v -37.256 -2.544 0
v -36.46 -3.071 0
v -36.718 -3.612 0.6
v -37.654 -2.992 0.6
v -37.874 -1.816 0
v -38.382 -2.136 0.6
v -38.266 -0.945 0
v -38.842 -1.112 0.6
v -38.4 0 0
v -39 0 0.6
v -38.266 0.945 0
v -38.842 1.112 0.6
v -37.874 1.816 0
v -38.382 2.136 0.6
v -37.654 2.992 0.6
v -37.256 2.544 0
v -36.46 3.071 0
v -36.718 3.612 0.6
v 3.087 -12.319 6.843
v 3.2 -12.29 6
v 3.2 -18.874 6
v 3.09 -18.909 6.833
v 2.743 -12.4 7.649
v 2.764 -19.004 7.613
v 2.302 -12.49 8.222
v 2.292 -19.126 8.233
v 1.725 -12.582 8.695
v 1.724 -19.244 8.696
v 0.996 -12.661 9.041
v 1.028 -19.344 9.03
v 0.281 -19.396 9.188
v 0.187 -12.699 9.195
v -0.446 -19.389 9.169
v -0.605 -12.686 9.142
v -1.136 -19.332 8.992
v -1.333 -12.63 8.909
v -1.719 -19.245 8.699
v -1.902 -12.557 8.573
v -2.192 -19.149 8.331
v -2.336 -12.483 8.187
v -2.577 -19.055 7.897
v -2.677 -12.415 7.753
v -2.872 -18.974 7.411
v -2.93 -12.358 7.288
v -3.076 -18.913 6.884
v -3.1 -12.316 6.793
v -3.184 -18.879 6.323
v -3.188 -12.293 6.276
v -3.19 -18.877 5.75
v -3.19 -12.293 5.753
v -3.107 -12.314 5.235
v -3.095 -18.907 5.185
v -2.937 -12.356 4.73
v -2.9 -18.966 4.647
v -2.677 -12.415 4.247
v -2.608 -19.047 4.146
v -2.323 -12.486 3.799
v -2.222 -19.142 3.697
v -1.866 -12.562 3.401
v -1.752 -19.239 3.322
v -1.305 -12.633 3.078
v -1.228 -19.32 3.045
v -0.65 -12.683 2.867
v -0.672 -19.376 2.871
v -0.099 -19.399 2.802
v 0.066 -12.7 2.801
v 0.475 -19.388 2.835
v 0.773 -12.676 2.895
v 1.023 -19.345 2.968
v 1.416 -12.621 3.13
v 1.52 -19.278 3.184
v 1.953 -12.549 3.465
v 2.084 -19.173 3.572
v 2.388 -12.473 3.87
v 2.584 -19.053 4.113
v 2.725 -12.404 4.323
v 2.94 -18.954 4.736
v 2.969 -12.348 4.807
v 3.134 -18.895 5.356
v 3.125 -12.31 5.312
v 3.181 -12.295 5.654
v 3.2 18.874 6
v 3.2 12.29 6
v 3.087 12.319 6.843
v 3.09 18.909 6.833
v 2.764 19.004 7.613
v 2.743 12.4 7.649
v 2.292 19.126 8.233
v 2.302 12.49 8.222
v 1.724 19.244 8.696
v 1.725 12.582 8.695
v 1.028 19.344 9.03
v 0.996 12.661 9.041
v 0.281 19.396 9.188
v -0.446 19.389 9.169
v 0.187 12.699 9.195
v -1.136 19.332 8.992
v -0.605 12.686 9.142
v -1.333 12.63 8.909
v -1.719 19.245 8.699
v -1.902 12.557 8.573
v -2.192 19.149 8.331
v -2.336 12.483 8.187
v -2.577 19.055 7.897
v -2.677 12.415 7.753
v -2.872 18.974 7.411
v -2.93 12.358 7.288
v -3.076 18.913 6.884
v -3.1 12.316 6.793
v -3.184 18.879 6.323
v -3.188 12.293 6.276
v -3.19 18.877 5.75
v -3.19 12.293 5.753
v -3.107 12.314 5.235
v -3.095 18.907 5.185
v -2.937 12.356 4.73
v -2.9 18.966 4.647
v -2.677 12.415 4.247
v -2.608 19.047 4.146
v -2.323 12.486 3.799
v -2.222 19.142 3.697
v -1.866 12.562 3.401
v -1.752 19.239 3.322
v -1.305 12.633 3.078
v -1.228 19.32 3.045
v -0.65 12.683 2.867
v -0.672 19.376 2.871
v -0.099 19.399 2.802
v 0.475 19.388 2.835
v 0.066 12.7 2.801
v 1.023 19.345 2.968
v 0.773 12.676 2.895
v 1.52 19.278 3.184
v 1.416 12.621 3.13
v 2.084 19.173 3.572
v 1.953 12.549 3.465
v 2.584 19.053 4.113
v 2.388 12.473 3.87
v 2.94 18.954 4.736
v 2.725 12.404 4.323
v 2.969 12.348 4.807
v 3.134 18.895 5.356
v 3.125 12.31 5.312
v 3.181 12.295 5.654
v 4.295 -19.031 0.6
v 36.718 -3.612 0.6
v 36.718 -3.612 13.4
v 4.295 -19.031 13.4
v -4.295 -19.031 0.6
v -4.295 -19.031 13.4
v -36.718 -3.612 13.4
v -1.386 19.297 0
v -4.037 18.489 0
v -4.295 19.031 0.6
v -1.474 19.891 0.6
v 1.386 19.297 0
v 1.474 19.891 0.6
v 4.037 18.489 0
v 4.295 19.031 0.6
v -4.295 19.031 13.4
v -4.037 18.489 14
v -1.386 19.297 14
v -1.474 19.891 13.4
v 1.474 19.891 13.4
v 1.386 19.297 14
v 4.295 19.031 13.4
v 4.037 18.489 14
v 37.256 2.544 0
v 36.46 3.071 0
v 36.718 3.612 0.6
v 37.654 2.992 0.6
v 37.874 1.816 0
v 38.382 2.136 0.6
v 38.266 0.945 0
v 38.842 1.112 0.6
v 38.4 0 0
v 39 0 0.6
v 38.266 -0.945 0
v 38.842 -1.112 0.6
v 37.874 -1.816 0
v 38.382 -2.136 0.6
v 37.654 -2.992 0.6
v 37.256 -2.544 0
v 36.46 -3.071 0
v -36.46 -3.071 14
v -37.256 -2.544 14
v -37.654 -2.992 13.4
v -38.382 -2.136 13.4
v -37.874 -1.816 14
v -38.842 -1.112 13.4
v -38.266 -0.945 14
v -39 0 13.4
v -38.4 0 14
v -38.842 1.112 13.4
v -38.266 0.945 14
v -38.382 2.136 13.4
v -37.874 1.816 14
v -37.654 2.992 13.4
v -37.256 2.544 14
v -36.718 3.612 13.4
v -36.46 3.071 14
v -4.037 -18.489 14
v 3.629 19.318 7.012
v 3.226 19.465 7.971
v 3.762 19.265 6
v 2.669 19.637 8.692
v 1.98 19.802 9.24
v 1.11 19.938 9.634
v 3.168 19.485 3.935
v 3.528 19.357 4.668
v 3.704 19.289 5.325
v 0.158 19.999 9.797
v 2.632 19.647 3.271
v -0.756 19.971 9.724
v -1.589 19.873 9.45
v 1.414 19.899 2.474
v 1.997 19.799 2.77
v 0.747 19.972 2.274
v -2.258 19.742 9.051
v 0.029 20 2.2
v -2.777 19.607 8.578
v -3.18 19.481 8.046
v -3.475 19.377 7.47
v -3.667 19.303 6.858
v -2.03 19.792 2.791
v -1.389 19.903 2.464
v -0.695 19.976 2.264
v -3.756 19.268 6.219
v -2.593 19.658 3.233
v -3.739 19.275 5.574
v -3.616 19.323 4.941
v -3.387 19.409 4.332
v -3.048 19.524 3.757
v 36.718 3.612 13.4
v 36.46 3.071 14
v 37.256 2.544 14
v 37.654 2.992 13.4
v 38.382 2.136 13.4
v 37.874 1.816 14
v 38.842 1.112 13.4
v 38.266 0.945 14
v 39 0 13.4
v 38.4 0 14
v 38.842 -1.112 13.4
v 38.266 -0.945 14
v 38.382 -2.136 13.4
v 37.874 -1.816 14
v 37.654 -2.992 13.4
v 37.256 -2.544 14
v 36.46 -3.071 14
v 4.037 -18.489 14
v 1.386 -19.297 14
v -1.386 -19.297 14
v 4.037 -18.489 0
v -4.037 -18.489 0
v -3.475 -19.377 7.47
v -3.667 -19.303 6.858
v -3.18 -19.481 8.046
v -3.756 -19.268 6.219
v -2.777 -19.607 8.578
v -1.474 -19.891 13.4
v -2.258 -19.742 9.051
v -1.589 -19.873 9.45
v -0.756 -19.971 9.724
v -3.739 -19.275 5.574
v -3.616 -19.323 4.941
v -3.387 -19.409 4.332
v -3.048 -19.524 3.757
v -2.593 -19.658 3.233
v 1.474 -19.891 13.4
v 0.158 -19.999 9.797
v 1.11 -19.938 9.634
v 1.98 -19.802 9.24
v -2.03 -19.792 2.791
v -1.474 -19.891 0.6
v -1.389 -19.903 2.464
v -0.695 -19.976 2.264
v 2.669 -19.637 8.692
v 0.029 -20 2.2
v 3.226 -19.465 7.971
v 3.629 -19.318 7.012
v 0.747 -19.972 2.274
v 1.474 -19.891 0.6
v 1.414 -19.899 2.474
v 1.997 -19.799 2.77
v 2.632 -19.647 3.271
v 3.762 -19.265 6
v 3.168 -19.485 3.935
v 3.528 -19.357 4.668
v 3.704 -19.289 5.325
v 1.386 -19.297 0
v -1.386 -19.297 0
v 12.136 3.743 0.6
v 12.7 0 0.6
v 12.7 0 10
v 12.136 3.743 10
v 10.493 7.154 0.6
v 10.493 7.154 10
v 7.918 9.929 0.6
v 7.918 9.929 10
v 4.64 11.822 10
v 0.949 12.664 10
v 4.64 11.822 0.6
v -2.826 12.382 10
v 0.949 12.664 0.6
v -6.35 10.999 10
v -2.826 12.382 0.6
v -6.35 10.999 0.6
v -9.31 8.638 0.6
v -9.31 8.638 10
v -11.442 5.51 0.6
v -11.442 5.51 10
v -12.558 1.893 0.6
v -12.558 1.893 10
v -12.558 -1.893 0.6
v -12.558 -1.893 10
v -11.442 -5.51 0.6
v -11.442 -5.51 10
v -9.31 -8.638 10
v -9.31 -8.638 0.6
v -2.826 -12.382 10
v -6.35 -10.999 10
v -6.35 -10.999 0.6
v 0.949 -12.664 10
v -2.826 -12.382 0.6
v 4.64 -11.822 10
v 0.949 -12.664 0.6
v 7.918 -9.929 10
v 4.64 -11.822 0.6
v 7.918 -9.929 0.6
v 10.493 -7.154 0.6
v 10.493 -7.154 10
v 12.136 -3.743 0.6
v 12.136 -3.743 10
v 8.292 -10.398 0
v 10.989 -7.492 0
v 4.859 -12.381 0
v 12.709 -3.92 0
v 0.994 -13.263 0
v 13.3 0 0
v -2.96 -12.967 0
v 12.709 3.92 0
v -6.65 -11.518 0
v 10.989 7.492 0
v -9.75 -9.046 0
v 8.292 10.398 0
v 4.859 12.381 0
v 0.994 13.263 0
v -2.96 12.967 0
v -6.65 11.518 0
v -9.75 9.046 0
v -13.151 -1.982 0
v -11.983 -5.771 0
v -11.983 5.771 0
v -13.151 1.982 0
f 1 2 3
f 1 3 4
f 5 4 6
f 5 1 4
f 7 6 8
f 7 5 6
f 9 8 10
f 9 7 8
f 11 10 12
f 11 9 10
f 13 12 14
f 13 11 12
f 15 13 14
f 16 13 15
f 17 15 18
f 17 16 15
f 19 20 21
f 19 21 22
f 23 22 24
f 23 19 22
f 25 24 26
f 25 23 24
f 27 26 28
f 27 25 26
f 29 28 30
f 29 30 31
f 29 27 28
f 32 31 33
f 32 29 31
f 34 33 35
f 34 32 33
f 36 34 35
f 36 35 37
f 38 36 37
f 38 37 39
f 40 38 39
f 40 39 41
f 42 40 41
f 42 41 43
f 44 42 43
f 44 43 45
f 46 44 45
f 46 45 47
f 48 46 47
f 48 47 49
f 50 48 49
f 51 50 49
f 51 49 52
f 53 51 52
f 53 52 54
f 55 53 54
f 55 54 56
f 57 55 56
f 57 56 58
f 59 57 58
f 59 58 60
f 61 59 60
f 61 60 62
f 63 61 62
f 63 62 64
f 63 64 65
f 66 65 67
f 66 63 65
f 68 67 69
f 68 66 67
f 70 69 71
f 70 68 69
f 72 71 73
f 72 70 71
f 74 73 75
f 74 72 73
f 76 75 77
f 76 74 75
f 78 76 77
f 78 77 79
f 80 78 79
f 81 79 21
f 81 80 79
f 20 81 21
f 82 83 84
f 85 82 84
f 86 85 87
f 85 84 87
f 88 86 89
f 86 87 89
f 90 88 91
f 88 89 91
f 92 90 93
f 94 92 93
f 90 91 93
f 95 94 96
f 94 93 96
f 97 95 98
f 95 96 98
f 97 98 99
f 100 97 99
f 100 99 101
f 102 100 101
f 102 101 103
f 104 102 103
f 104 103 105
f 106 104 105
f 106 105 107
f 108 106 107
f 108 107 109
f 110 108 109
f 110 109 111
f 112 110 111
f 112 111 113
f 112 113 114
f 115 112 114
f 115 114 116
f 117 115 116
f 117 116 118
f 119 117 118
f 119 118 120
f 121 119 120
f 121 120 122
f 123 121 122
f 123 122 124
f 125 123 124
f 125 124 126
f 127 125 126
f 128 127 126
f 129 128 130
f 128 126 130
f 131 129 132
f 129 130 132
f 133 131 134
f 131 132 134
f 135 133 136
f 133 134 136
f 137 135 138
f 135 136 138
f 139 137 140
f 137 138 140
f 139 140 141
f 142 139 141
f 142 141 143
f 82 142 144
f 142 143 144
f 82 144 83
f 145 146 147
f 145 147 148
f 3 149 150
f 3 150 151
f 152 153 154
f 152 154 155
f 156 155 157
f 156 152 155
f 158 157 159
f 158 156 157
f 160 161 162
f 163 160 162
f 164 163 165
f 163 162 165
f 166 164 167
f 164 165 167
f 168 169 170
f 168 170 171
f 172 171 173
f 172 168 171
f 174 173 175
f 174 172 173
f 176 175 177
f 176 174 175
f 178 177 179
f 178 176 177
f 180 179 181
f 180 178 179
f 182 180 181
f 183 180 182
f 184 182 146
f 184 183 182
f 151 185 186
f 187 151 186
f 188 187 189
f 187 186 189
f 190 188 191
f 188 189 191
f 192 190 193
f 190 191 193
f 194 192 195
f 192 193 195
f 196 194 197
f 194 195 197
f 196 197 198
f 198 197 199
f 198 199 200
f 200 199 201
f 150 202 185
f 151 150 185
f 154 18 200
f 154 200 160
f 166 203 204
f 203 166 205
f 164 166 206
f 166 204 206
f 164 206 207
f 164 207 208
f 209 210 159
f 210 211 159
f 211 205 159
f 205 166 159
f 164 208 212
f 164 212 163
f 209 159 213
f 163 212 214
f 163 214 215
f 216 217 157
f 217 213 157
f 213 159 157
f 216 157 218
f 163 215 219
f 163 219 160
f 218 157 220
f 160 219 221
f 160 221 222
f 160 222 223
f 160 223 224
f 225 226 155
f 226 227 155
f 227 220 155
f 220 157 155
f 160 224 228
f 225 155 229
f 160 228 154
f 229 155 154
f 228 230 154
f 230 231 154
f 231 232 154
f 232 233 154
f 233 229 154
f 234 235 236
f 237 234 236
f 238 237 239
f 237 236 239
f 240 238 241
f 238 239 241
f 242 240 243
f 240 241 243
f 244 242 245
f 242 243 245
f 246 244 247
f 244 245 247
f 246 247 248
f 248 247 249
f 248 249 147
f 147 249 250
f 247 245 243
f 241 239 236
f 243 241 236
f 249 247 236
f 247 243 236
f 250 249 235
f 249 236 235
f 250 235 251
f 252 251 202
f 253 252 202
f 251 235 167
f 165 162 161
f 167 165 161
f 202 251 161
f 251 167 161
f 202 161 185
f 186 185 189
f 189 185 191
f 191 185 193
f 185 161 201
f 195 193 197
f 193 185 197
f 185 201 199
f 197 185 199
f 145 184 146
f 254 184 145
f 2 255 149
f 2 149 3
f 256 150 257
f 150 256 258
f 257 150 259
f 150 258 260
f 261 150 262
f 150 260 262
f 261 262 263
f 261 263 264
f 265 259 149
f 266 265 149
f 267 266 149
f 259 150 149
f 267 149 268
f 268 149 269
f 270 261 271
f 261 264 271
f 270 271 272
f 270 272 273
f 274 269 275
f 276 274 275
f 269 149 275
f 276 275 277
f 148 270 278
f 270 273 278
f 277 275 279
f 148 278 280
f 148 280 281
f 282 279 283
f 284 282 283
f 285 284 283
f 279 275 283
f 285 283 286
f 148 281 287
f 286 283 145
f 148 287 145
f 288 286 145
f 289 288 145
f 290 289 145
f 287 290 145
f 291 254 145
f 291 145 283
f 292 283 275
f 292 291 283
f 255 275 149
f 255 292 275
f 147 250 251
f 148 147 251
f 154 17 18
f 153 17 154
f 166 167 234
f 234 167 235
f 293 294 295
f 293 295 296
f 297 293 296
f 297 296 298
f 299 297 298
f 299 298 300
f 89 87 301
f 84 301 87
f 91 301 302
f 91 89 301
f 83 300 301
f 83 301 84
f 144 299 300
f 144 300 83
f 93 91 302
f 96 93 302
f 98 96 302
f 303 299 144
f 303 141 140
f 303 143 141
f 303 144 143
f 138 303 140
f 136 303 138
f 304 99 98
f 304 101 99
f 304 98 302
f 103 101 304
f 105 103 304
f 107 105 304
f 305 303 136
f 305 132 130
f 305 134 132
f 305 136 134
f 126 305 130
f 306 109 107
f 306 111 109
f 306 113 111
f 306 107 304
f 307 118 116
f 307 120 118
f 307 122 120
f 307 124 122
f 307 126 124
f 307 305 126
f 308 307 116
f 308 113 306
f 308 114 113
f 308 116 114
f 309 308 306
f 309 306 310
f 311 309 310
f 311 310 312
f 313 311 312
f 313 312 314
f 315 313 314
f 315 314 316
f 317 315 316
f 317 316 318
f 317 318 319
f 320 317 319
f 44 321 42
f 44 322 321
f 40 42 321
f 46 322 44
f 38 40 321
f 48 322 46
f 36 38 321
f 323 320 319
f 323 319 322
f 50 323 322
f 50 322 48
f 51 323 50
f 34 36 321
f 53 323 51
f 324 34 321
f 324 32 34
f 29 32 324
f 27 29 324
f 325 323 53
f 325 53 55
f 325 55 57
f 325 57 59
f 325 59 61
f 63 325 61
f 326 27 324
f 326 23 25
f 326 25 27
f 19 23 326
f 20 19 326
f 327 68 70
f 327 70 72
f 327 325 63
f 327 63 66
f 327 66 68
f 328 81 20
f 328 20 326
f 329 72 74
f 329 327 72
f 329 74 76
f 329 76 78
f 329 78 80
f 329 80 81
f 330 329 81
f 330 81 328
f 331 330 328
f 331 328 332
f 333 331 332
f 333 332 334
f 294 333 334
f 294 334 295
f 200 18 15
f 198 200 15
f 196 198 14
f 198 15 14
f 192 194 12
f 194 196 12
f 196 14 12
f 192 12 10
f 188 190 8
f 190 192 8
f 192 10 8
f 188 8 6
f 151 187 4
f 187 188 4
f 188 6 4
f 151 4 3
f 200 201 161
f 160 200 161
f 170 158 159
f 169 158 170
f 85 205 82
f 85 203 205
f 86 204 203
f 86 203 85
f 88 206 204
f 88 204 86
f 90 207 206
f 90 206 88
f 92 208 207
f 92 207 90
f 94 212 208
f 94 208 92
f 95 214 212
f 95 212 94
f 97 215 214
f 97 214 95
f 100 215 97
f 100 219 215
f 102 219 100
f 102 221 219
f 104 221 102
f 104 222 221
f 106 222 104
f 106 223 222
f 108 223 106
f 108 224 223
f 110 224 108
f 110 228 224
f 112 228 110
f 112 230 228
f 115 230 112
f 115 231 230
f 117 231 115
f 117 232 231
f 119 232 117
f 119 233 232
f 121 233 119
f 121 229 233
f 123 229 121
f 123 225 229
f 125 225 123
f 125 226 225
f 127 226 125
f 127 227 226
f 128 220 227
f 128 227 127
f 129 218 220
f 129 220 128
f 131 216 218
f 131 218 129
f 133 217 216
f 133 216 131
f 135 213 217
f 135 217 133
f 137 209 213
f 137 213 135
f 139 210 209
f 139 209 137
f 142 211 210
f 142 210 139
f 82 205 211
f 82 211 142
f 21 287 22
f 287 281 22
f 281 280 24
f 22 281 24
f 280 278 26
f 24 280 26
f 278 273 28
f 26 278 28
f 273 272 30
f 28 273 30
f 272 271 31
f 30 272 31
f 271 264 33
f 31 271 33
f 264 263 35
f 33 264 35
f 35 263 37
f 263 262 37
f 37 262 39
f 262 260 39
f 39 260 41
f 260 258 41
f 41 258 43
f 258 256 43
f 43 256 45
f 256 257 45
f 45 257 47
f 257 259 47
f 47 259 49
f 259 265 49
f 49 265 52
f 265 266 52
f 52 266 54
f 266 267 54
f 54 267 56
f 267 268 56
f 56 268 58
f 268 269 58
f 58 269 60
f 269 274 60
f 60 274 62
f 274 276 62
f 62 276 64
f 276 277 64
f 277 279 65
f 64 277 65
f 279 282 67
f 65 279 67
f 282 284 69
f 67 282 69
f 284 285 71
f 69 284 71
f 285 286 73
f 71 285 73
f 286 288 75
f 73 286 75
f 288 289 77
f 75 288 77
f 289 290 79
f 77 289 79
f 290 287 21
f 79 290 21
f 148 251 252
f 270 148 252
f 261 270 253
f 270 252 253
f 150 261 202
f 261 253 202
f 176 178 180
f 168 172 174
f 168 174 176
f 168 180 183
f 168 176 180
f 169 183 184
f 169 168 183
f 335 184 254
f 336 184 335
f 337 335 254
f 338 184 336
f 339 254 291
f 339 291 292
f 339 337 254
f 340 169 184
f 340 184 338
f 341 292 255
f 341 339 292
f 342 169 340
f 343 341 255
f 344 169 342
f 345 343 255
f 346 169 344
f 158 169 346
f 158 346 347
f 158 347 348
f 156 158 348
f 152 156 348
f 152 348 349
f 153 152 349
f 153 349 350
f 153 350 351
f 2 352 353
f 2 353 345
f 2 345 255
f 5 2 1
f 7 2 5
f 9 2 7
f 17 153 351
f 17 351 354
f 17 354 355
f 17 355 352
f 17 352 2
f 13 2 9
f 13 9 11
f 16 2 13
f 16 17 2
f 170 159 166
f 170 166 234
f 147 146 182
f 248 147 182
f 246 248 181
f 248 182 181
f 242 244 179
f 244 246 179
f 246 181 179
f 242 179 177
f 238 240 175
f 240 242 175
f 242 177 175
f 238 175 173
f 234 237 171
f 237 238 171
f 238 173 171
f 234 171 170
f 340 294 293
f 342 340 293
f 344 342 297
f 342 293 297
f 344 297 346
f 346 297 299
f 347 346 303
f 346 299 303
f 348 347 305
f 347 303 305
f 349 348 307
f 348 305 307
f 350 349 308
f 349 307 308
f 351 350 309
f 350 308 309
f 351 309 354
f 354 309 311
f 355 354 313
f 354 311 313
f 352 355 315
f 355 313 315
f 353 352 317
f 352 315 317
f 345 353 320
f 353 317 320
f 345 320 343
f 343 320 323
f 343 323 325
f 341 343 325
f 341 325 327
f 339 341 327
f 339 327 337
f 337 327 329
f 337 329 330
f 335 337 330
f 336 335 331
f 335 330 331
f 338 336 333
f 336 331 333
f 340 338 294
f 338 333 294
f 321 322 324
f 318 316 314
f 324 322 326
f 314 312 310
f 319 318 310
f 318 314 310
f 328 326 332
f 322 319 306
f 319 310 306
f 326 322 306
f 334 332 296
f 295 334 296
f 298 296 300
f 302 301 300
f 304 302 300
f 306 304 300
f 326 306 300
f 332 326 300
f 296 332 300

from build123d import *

# Parameters (mm, degrees)
PAD_DEPTH            = 14
SKETCH001_R          = 12.7
POCKET_DEPTH         = 10
SKETCH002_R          = 3.2
POCKET001_DEPTH      = 20.001
POCKET001_DEPTH_BACK = -20.001
CHAMFER_SIZE         = 0.6


with BuildPart() as part:
    # Sketch → Pad (new body)
    with BuildSketch(Plane.XY):
        with BuildLine():
            Line((-36.717816, 3.612355), (-4.294539, 19.030888))
            ThreePointArc((4.294539, 19.030888), (0, 20), (-4.294539, 19.030888))
            Line((4.294539, 19.030888), (36.717816, 3.612355))
            ThreePointArc((36.717816, -3.612355), (39, 0), (36.717816, 3.612355))
            Line((36.717816, -3.612355), (4.294539, -19.030888))
            ThreePointArc((-4.294539, -19.030888), (0, -20), (4.294539, -19.030888))
            Line((-4.294539, -19.030888), (-36.717816, -3.612355))
            ThreePointArc((-36.717816, 3.612355), (-39, 0), (-36.717816, -3.612355))
        make_face()
    extrude(amount=PAD_DEPTH)

    # Sketch001 → Pocket (cut)
    with BuildSketch(Plane.XY):
        Circle(SKETCH001_R)
    extrude(amount=POCKET_DEPTH, mode=Mode.SUBTRACT)

    # Sketch002 → Pocket001 (cut, two sides)
    with BuildSketch(Plane(origin=(0, 0, -1), x_dir=(1, 0, 0), z_dir=(0, -1, 0))) as pocket001_sk:
        with Locations((0, 7)):
            Circle(SKETCH002_R)
    extrude(amount=-POCKET001_DEPTH, mode=Mode.SUBTRACT)
    extrude(pocket001_sk.sketch, amount=-POCKET001_DEPTH_BACK, mode=Mode.SUBTRACT)

    # Chamfer
    chamfer_edges = [part.edges().sort_by_distance(p)[0] for p in [
        (-20.506178, 11.321621, 0),
        (-39, 0, 0),
        (0, 20, 0),
        (-20.506178, -11.321621, 0),
        (20.506178, 11.321621, 0),
        (0, -20, 0),
        (39, 0, 0),
        (20.506178, -11.321621, 0),
        (-12.7, 0, 0),
        (-20.506178, 11.321621, 14),
        (0, 20, 14),
        (20.506178, 11.321621, 14),
        (39, 0, 14),
        (20.506178, -11.321621, 14),
        (0, -20, 14),
        (-20.506178, -11.321621, 14),
        (-39, 0, 14),
        (-3.2, -19.474175, 6),
        (-3.2, 19.474175, 6),
    ]]
    chamfer(chamfer_edges, length=CHAMFER_SIZE)


solid = part.part
